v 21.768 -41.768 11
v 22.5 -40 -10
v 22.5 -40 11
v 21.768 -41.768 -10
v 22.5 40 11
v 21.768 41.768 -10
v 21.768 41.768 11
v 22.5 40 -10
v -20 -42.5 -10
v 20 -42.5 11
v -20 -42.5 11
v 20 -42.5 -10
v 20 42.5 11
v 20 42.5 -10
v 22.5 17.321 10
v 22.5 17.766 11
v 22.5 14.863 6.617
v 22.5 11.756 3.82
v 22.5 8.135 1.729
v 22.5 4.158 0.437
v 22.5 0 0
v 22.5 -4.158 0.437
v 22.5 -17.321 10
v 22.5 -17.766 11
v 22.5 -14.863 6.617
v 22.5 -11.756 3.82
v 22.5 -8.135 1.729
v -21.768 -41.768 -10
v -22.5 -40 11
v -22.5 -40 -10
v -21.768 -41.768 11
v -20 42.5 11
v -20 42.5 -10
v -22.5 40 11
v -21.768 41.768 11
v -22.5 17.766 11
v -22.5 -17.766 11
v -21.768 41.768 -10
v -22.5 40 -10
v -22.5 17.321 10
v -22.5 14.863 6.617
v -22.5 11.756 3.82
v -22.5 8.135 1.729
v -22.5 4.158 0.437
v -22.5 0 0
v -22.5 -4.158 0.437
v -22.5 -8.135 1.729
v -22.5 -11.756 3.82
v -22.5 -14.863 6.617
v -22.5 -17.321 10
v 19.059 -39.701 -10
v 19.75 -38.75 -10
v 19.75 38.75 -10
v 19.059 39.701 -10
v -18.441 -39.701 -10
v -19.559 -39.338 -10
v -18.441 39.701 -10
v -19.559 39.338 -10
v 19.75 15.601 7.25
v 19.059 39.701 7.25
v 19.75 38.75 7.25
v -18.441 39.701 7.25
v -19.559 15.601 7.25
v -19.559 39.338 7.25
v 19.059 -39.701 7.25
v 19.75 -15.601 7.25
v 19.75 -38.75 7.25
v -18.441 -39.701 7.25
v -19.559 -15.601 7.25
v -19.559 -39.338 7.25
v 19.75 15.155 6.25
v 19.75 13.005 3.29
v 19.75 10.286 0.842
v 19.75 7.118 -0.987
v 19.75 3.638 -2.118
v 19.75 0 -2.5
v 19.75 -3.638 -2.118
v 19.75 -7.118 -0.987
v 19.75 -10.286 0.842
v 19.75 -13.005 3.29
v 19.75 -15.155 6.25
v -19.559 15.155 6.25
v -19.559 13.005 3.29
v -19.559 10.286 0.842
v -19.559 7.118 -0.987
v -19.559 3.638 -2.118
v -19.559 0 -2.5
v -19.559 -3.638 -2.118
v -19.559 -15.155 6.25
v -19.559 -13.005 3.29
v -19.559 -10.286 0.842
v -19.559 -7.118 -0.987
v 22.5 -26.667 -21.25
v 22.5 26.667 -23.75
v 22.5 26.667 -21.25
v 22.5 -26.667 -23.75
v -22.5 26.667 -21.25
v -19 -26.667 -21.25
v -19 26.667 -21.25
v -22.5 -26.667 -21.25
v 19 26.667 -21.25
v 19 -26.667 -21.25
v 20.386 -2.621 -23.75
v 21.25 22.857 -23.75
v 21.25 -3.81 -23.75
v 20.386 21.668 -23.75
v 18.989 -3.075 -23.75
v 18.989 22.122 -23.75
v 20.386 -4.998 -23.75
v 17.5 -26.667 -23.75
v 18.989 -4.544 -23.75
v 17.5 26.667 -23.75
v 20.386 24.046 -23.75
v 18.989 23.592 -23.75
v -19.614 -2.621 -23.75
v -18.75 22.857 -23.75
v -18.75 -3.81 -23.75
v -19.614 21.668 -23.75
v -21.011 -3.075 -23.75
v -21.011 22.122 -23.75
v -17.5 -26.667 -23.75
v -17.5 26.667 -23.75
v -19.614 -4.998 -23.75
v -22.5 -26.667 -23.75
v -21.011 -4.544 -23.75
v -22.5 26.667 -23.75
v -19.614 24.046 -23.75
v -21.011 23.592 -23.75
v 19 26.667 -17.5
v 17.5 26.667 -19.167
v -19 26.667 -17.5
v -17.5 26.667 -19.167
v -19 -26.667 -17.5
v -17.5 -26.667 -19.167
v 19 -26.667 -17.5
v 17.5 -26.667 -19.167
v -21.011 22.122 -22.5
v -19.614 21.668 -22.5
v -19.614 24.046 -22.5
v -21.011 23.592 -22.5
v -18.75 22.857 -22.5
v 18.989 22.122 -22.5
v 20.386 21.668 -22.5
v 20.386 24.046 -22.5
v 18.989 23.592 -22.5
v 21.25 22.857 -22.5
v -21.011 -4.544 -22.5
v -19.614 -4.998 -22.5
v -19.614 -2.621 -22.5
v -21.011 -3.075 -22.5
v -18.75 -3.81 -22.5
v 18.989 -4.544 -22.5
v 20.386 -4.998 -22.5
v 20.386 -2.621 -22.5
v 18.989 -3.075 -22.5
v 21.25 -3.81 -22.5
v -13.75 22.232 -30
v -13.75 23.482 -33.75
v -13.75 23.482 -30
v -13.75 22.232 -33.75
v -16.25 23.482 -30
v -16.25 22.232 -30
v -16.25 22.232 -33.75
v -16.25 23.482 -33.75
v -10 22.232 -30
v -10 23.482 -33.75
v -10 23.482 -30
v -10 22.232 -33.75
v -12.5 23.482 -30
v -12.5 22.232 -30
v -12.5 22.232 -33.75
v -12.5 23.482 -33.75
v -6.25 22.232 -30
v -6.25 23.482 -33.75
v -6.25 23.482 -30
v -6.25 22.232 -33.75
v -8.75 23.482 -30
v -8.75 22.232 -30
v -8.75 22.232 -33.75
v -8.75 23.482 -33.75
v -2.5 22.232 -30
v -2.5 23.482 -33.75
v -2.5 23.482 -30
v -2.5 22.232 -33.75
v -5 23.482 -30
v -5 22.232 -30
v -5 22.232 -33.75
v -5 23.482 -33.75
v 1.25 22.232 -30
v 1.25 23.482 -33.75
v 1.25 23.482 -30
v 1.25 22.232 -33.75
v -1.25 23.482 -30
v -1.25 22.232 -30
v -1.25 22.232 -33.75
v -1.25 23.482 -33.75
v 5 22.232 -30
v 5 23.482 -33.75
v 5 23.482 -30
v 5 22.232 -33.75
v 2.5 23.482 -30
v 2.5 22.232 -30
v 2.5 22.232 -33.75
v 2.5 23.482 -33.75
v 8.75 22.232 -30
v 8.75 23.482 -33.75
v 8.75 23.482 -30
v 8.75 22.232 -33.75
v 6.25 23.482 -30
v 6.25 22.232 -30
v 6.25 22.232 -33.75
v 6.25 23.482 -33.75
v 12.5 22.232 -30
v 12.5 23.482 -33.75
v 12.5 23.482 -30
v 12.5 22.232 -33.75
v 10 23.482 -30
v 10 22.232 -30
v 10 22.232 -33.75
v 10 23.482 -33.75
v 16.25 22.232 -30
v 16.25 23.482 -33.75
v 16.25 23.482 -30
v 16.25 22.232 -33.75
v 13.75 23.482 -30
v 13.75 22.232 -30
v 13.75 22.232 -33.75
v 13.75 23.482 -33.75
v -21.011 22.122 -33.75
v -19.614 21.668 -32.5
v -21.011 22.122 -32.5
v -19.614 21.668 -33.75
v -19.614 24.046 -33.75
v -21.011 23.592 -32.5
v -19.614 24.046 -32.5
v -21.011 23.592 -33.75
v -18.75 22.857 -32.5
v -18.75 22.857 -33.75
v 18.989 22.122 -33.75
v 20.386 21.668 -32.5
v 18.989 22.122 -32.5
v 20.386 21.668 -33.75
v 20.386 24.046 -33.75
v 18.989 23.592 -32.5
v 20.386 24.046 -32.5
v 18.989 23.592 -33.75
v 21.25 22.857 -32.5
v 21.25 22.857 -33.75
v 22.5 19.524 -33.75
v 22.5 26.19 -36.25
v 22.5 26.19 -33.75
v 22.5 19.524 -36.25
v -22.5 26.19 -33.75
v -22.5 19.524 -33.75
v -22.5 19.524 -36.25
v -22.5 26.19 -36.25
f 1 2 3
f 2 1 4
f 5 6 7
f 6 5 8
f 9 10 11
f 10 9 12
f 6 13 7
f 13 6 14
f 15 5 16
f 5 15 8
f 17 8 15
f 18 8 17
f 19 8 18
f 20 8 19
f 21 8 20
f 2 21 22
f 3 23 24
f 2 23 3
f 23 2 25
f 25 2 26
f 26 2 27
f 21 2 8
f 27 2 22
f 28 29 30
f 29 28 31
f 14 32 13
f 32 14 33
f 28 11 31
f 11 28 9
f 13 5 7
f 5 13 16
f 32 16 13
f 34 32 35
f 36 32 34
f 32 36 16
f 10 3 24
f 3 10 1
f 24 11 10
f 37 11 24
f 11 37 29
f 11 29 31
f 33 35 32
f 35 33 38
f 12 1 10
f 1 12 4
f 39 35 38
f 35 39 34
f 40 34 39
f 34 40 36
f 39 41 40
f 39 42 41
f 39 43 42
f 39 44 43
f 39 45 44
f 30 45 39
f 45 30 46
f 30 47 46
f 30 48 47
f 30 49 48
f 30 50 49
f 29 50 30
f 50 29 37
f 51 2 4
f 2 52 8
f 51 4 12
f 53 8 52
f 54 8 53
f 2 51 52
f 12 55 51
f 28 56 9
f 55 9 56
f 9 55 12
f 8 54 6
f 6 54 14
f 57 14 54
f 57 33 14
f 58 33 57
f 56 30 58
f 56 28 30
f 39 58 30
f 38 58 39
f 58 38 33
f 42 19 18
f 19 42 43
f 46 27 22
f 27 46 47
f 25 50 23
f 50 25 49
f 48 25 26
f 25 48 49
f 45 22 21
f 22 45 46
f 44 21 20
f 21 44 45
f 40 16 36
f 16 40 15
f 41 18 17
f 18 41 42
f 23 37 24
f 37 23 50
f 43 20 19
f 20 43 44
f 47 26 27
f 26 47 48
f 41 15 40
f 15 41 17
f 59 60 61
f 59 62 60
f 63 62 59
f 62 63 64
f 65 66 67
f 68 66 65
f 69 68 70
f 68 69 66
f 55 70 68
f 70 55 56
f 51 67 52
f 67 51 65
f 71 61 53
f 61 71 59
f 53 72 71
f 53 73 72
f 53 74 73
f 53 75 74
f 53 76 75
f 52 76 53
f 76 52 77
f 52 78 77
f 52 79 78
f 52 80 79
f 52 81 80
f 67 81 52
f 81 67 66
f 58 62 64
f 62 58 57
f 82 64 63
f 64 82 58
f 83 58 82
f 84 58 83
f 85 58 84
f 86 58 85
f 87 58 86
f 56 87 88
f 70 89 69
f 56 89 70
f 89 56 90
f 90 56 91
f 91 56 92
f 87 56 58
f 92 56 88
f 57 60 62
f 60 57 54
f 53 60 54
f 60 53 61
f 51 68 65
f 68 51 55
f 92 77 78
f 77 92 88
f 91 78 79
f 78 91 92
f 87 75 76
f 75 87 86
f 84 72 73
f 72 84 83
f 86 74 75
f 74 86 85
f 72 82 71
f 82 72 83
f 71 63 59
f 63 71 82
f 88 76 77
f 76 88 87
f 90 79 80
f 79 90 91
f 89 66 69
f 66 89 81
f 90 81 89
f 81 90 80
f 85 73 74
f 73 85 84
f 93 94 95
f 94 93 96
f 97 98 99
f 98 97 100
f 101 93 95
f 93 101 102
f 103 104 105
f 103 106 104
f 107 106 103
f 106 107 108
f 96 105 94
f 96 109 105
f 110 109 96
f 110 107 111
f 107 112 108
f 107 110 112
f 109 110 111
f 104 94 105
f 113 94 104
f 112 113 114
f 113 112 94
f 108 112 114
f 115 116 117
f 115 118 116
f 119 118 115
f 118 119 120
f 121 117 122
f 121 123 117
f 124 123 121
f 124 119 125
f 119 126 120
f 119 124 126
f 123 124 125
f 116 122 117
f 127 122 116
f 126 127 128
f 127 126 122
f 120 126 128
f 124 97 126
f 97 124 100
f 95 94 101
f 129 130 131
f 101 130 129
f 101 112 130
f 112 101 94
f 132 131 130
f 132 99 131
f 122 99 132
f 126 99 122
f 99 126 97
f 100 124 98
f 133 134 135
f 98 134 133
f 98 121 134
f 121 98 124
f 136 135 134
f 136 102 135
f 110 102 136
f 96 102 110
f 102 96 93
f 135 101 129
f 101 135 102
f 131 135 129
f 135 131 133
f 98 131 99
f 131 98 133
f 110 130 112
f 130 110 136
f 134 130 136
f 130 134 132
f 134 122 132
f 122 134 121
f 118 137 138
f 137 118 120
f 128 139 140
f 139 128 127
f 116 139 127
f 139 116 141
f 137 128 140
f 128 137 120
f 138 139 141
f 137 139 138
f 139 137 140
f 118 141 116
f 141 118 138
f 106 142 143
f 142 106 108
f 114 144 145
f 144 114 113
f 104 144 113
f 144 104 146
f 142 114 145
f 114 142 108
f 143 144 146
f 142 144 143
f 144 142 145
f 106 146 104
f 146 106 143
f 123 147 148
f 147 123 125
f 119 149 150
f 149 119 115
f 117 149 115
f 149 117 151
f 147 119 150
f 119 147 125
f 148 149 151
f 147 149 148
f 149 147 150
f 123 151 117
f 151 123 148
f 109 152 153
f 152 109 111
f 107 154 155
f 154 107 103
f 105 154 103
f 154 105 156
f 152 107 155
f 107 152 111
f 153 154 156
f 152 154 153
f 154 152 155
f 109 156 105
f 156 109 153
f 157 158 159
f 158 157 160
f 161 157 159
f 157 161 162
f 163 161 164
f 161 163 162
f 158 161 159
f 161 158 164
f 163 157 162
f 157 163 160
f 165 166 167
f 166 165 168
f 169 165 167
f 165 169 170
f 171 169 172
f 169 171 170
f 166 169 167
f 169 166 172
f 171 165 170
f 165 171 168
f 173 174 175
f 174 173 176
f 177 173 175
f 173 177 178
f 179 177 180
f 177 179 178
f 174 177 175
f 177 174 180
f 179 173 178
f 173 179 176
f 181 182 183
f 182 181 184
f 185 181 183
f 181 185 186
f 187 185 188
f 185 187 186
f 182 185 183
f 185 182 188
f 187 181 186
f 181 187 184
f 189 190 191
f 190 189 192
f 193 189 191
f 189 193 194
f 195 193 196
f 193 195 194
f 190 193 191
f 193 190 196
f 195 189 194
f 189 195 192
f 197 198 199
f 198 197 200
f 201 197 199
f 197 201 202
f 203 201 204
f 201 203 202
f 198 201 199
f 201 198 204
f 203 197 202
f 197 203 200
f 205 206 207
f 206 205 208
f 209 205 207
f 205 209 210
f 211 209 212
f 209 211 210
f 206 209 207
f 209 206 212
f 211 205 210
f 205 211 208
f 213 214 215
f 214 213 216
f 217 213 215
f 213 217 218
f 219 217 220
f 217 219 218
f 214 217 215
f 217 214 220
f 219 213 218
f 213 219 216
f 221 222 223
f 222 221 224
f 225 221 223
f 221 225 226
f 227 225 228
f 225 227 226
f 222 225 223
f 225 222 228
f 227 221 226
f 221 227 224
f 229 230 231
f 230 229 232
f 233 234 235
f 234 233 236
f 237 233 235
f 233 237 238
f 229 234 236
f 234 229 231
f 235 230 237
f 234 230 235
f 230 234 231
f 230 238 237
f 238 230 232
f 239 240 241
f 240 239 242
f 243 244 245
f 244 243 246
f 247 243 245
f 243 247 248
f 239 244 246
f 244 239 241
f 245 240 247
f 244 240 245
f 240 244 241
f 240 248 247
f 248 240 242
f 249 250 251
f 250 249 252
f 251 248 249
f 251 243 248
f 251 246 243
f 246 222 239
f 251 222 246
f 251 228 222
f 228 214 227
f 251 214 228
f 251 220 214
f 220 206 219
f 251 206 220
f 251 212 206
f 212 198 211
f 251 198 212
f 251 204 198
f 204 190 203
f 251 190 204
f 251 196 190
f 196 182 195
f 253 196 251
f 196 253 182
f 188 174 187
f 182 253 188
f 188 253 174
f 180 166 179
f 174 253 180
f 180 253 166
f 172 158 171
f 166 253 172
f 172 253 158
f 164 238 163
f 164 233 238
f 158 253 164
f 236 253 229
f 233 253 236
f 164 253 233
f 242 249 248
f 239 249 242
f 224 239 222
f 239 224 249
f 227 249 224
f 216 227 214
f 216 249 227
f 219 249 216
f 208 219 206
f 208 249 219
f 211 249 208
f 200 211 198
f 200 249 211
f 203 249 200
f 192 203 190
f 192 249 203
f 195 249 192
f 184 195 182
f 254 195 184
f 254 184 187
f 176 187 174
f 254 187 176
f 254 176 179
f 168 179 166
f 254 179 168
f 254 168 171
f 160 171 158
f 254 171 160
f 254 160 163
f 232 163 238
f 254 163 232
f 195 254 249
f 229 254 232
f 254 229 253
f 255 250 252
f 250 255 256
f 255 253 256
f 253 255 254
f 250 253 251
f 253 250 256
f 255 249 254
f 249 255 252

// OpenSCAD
// DIYbio EasyPhoresis
// by alec_djinn 2014
// www.diybiogroningen.org
// Version: beta 2

// dimensions
width = 40;
height = 20;
depth = 80;
thickness = 2.5;


// body shape
module body(width,height,depth,thickness){
	difference() {
		minkowski(){
			cube([width,depth,height], center=true);
			cylinder(r=thickness, h=1);
		}
		translate([0,0,height]){
			rotate([0,90,0]){
				cylinder (h=2*width, r=height, center=true);
			}
		}
	}
}


module gel(width,height,depth,thickness){
	translate([0,0,-height]){
	difference(){
		difference(){
			union(){
				translate([0,0,-height/8]){
					cube([width+2*thickness,depth/1.5,height/8], center=true);
				}
				cube([width-2,depth/1.5,height/4], center=true);
			}
			translate([0,0,-height/12]){
				cube([width-(2*thickness),depth/1.2,height/4], center=true);
			}
		}
		// comb holder
		translate([-width/2,depth/3.5,-2*thickness]){
			cylinder(h=thickness, r=thickness/2);
		}
		translate([width/2,depth/3.5,-2*thickness]){
			cylinder(h=thickness, r=thickness/2);
		}
		translate([-width/2,-depth/(6*3.5),-2*thickness]){
			cylinder(h=thickness, r=thickness/2);
		}
		translate([width/2,-depth/(6*3.5),-2*thickness]){
			cylinder(h=thickness, r=thickness/2);
		}
	}
	}
}

// 9 wells comb
module comb(width,height,depth,thickness){
	translate([0,0,-1.5*height]){
		union(){
			translate([-width/2,depth/3.5,-2*thickness]){
				cylinder(h=thickness, r=thickness/2);
			}
			translate([width/2,depth/3.5,-2*thickness]){
				cylinder(h=thickness, r=thickness/2);
			}
			translate([0,depth/3.5,(-height/8)-thickness]){
				cube([width+2*thickness,depth/12,height/8],center=true);	
			}
			translate([thickness/2,0,0]){
				// numbers of wells
				for(n=[1:2.4*width/10]){
					translate([(-width/2)+thickness*n*1.5,depth/3.5,-height/10]){
						cube([thickness,depth/64,height/5],center=true);	
					}
				}
			}
		}
	}
}

// body: shape - void
difference(){
	body(width,height,depth,thickness);
	translate([0,0,-thickness]){
		body(width-thickness,height-thickness,depth-thickness);
	}
}

// gel
gel(width,height,depth,thickness);

// comb
comb(width,height,depth,thickness);
